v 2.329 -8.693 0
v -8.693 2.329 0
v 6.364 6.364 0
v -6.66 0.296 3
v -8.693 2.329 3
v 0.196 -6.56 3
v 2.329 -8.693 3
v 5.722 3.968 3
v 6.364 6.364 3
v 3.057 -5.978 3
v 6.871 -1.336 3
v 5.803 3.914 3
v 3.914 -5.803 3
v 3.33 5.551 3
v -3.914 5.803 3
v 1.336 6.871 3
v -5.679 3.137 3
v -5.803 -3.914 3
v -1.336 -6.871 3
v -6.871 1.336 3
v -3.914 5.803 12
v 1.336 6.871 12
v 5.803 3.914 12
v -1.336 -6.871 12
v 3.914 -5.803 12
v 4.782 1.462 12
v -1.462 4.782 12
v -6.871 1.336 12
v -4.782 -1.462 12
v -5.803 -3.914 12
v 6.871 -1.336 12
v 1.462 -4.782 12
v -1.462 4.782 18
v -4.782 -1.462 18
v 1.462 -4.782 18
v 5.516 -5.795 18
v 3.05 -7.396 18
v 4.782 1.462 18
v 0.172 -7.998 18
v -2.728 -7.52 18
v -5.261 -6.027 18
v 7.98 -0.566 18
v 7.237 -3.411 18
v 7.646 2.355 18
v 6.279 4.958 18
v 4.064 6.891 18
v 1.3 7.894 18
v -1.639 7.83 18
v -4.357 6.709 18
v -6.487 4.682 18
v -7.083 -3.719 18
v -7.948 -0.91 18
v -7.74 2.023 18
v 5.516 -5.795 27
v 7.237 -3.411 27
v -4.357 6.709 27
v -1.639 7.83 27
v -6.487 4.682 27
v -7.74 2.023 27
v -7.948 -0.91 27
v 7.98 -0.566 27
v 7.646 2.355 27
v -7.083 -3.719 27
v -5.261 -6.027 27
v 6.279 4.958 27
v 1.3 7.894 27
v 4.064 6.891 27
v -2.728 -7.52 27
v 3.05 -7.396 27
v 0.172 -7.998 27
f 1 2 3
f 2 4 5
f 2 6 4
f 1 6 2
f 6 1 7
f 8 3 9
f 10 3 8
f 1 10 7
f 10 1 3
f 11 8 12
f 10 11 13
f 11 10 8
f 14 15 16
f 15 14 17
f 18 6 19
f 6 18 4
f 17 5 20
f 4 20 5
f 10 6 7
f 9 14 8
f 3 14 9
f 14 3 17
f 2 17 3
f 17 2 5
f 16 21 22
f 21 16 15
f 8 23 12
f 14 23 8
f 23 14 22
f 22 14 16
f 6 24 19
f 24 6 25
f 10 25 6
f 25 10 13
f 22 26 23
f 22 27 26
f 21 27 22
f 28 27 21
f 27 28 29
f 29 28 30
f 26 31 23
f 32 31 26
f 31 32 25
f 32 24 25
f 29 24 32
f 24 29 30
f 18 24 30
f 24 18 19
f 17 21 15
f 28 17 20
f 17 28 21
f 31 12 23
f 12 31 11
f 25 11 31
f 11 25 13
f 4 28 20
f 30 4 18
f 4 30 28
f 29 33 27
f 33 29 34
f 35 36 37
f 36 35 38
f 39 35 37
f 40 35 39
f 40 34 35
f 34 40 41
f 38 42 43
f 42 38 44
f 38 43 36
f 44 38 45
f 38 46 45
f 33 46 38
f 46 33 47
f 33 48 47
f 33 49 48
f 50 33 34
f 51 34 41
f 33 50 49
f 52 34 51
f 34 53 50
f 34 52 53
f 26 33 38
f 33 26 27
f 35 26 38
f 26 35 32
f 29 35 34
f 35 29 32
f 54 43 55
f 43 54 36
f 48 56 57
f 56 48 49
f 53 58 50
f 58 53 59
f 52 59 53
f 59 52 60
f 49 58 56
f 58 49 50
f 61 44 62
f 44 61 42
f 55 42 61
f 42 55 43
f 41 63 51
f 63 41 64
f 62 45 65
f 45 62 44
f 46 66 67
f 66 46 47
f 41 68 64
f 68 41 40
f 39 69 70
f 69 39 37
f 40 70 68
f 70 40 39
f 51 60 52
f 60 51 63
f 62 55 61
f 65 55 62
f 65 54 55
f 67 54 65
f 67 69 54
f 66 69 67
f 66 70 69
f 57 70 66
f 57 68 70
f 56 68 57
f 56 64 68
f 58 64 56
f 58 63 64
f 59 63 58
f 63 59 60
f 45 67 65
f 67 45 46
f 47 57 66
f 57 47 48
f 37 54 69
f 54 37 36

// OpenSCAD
// [inibitore, orientamento,  raggio, facce, altezza]
genome = [1,45,9,3,3,0,123,5,5,6,1,34,7,8,9,1,197,5,4,6,0,281,7,3,4,0,12,4,7,8,1,123,8,17,9];
gene_len=5;
function altezz(index) = ( index == 0 ? 0 : genome[index-gene_len]*genome[index-1] + altezz(index-gene_len) ); 

raggi = [ for (i = [2 : gene_len : len(genome)]) genome[i] ];
min_r = min(raggi);

for (g=[0:gene_len:len(genome)-gene_len]){
    inibitore = genome[g];
    orientamento = genome[g+1];
    raggio = genome[g+2];
    facce = genome[g+3];
    altezza = genome[g+4];
    if(inibitore==1){ 
        translate([0,0,altezz(g)])
            linear_extrude(height = altezza)
                rotate([0,0,orientamento])
                    circle(raggio,$fn=facce);
    }

}
